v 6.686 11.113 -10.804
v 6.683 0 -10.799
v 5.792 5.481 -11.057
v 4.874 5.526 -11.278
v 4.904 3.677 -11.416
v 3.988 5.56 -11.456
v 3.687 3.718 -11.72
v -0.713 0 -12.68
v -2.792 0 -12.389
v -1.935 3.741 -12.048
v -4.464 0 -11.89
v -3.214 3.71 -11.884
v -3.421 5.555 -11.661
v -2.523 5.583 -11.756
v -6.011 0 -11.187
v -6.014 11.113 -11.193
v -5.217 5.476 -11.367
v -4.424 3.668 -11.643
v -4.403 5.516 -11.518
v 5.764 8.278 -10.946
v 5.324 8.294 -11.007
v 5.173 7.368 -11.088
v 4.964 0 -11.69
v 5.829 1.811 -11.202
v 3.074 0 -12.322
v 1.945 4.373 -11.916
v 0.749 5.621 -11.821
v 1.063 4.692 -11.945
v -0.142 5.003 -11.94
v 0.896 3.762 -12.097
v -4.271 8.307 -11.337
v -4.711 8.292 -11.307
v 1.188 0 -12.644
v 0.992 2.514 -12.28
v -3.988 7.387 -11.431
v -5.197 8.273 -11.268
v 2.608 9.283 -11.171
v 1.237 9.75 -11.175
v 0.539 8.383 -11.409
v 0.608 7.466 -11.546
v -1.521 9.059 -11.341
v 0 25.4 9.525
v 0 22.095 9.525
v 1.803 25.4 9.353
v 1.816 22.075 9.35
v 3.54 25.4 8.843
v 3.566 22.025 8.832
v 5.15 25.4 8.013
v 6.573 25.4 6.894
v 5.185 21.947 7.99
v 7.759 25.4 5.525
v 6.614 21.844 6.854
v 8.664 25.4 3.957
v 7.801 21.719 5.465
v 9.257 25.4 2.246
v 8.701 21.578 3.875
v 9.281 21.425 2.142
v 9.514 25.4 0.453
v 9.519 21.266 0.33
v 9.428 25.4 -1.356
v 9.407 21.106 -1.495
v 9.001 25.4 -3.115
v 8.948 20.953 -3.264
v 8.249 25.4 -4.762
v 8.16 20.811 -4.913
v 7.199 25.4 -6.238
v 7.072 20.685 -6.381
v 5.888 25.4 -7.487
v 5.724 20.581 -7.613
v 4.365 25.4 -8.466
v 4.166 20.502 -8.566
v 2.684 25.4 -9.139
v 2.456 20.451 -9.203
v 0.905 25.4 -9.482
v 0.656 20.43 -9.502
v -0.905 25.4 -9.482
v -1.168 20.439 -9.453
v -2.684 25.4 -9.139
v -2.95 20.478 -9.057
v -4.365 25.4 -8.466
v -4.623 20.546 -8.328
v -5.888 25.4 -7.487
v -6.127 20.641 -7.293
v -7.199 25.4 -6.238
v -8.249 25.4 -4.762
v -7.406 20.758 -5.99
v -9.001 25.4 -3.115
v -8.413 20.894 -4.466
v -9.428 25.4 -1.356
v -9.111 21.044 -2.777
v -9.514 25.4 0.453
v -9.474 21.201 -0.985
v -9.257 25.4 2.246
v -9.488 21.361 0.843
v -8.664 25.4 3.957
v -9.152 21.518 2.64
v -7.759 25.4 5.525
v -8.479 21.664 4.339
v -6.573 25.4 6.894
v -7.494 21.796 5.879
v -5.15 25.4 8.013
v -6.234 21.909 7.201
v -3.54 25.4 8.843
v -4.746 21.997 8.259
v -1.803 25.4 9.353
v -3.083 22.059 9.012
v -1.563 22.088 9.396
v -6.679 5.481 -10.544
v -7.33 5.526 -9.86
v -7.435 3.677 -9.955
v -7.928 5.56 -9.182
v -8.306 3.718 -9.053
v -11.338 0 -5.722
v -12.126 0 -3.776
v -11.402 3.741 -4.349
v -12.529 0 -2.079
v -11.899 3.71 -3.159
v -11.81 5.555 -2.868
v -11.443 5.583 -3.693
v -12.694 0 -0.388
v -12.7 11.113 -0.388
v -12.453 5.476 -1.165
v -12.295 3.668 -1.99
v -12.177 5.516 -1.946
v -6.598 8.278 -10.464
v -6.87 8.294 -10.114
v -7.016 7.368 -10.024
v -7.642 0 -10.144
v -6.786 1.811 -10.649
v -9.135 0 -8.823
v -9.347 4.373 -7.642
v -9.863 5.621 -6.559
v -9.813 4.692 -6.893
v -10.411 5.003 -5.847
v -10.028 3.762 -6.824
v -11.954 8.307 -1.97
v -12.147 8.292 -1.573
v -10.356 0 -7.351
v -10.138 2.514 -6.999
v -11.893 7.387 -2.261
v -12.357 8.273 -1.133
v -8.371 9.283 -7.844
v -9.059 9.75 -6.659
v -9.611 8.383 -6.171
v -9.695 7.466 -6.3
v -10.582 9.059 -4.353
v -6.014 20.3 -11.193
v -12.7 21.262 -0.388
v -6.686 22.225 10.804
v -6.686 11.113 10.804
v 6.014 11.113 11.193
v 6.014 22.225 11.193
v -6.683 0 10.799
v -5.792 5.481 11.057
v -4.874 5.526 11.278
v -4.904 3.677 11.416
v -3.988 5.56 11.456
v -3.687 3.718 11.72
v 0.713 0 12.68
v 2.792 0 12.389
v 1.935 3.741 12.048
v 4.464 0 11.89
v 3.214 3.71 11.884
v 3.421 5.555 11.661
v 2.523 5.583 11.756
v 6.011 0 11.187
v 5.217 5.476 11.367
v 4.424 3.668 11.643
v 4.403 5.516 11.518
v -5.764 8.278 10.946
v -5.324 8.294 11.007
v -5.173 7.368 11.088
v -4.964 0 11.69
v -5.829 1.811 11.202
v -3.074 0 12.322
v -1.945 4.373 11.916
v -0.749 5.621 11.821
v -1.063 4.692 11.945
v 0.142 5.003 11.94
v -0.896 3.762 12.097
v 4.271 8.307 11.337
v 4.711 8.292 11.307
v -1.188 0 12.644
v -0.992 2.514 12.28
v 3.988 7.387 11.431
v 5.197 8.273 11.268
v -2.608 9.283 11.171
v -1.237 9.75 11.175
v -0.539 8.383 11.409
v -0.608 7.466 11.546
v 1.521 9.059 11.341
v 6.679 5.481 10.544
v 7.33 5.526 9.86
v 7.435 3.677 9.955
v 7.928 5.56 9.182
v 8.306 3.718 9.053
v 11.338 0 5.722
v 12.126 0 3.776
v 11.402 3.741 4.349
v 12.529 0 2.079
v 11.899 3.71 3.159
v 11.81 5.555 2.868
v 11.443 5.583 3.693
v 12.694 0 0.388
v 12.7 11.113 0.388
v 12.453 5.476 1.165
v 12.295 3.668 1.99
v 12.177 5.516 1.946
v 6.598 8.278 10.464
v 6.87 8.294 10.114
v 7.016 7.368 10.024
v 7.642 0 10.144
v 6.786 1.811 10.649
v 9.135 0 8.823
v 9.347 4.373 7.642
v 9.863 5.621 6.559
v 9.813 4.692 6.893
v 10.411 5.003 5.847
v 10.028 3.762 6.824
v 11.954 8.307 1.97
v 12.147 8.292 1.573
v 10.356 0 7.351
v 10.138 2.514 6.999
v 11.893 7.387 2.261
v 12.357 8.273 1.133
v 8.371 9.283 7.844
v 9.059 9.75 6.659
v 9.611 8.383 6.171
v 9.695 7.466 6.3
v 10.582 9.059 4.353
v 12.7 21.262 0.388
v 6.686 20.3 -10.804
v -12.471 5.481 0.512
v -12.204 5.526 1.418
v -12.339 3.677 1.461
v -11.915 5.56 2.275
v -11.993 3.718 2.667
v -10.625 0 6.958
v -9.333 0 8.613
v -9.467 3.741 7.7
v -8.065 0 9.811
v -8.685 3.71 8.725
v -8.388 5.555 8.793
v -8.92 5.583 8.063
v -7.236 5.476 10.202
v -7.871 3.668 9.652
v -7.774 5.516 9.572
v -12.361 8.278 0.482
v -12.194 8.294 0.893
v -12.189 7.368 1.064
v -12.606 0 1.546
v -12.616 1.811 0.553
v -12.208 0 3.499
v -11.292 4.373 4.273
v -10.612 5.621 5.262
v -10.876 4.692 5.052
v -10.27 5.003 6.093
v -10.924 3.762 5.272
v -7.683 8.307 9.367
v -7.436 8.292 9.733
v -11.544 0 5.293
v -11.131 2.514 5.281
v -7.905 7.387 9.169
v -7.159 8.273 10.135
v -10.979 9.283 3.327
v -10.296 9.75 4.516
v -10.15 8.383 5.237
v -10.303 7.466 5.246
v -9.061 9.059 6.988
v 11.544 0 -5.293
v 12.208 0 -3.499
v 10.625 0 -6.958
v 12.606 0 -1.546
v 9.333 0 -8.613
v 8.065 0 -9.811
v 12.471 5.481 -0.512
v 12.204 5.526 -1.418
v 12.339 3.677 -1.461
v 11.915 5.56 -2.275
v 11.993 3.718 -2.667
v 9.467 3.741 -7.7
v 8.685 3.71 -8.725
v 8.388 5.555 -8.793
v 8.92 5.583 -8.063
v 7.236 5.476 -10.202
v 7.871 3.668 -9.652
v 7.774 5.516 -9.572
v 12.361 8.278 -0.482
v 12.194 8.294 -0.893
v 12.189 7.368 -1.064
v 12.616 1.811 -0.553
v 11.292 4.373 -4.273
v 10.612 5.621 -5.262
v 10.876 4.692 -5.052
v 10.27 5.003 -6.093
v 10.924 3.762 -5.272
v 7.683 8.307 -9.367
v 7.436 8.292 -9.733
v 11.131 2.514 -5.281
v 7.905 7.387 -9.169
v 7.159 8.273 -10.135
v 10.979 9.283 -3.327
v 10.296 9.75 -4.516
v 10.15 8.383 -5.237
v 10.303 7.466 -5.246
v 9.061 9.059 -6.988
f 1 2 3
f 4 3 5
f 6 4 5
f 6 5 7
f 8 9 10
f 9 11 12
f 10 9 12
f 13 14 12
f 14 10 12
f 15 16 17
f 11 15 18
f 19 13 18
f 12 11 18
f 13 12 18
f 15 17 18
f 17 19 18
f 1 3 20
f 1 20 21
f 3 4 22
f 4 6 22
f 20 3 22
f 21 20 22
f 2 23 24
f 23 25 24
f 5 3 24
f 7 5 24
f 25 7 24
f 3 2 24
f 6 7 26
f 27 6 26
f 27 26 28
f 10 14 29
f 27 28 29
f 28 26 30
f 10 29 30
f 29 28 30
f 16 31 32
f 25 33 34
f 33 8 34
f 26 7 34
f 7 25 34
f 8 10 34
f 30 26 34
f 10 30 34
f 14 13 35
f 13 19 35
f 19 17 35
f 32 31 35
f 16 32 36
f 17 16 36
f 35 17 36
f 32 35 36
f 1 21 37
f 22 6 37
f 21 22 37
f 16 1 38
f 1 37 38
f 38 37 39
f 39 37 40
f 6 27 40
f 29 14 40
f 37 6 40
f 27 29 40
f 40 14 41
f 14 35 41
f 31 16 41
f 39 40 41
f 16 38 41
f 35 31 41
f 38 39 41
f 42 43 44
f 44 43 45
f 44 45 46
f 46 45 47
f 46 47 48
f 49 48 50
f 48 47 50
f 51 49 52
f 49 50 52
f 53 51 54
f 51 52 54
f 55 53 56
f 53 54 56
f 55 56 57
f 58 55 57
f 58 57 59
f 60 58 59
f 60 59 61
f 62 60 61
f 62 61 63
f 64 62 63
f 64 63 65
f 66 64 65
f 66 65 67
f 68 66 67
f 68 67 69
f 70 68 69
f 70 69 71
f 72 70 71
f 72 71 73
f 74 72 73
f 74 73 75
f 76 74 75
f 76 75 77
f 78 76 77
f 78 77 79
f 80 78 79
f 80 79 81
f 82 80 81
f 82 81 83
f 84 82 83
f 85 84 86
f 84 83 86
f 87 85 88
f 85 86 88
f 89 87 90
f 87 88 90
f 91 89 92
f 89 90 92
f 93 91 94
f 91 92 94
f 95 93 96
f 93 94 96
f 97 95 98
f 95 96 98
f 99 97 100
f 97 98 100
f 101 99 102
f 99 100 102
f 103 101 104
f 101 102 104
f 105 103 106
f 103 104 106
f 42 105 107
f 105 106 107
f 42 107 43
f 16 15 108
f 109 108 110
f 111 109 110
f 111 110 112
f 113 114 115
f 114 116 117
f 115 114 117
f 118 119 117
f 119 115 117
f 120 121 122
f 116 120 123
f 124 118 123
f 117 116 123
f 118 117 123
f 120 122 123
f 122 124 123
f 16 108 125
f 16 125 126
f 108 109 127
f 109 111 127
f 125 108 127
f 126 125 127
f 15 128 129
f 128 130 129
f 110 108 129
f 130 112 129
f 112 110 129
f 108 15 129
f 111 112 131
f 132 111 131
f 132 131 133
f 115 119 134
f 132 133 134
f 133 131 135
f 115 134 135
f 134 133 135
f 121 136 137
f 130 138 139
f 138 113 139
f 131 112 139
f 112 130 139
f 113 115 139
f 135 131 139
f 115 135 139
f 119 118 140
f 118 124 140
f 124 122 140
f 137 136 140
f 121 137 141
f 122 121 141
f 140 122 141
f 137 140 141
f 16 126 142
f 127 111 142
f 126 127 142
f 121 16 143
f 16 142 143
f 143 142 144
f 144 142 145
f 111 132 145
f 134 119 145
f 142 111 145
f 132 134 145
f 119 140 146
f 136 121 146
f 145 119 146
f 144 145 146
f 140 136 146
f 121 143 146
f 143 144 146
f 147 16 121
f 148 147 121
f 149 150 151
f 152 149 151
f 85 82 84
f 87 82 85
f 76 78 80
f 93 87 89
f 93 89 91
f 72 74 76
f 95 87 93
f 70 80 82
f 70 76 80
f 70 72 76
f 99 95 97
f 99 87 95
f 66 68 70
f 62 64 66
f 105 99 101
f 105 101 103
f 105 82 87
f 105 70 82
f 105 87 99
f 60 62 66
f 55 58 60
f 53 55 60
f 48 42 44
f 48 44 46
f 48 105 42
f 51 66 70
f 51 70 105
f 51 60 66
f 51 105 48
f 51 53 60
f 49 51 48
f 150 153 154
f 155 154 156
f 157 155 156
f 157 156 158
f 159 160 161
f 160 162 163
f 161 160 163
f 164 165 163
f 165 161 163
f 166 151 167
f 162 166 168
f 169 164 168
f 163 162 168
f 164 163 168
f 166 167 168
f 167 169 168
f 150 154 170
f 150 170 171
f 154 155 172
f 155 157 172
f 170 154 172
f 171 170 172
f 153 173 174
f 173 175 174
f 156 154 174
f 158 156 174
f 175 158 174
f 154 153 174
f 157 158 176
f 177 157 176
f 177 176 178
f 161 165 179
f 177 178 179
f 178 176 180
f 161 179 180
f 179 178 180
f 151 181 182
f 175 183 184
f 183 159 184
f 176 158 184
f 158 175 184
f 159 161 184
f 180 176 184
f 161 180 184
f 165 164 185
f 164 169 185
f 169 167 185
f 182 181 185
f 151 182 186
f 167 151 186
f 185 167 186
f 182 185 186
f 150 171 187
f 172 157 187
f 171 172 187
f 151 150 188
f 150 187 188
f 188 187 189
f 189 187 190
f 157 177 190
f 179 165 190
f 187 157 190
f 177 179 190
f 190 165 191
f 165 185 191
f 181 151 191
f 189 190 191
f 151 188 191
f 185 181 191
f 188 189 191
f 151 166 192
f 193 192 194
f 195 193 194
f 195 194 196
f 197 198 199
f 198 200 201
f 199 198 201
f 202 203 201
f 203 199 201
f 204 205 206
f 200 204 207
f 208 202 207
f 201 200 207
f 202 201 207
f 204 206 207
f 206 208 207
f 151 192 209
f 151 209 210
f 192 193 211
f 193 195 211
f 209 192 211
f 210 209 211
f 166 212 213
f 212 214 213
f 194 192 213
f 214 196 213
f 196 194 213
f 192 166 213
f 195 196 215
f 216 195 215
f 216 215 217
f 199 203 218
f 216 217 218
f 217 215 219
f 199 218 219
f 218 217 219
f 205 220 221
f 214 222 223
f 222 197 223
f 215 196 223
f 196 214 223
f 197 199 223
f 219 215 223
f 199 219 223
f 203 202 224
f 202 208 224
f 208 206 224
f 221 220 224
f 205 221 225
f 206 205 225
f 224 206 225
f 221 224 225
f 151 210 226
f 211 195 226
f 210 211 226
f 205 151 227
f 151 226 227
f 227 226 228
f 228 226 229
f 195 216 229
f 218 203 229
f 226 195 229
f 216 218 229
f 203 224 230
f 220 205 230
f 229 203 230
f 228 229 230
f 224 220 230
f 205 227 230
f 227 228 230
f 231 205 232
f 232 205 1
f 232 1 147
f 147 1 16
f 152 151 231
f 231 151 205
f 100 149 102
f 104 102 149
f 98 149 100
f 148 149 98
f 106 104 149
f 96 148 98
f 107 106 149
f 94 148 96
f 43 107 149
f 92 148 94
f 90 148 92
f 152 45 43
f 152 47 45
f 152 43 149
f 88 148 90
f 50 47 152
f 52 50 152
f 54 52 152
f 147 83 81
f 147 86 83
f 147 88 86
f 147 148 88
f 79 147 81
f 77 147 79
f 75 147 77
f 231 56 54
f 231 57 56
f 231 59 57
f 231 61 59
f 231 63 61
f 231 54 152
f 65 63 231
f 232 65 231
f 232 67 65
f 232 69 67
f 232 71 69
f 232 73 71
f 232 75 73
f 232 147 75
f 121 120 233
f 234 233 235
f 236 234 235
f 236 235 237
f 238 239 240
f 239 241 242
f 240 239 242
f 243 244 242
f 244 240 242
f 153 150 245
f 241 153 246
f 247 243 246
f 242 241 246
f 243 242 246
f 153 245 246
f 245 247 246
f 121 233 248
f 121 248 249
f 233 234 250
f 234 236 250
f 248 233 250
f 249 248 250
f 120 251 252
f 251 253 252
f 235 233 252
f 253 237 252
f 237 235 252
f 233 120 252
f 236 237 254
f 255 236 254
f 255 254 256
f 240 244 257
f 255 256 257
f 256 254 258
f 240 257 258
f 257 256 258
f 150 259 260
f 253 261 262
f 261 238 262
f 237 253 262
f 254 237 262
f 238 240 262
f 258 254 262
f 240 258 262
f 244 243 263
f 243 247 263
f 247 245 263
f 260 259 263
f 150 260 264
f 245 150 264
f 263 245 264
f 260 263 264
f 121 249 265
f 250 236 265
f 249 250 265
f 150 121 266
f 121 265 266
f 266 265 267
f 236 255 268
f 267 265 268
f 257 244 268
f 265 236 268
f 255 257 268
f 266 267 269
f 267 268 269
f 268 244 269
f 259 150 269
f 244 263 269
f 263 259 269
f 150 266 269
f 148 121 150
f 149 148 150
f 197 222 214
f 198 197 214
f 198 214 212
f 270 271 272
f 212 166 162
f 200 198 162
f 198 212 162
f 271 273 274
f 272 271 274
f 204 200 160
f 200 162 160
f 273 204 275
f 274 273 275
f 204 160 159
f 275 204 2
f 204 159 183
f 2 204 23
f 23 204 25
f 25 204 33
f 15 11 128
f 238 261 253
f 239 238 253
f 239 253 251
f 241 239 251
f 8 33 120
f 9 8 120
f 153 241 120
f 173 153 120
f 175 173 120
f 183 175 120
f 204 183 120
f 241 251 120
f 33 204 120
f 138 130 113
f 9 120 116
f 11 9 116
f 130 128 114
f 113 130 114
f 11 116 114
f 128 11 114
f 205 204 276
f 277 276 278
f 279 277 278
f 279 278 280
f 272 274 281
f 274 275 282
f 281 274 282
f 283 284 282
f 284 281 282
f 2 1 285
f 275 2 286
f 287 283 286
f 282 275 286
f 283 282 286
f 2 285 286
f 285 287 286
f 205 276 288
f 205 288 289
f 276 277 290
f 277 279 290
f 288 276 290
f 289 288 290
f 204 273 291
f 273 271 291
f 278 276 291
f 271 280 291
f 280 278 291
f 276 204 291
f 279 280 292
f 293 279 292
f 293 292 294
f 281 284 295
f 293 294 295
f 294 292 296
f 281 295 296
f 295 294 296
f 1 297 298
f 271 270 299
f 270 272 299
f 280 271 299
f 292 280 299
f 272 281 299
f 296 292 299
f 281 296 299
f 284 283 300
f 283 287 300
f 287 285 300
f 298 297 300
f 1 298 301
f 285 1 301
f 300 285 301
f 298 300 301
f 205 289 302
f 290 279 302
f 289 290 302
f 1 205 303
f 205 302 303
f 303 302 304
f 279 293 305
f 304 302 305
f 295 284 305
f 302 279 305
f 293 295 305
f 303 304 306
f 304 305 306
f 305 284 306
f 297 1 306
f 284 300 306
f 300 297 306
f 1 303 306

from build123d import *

# Parameters (mm, degrees)
BOSS_EXTRUDE1_DEPTH      = 11.1125
DRAFT2_START             = 21.18139532
DRAFT2_OUTLINE_W         = 28
DRAFT2_OUTLINE_H         = 26
DRAFT2_DEPTH             = 1.91806369
BOSS_EXTRUDE2_DEPTH      = 3.175
BOSS_EXTRUDE2_DEPTH_BACK = 3.175
SKETCH7_R                = 9.525


# Read off the part's stored shape, not the designer's step: Draft2
with BuildPart() as part:
    # Sketch3 → Loft1 section 0
    with BuildSketch(Plane(origin=(0, 11.1125, 0), x_dir=(1, 0, 0), z_dir=(0, 1, 0))):
        with BuildLine():
            Line((6.01391392, -11.192562017), (12.7, -0.388078778))
            Line((12.7, -0.388078778), (6.68608608, 10.804483239))
            Line((6.68608608, 10.804483239), (-6.01391392, 11.192562017))
            Line((-6.01391392, 11.192562017), (-12.7, 0.388078778))
            Line((-12.7, 0.388078778), (-6.68608608, -10.804483239))
            Line((-6.68608608, -10.804483239), (6.01391392, -11.192562017))
        make_face()
    # Sketch2 for Loft1 → Loft1 section 1
    with BuildSketch(Plane(origin=(0, 0, 0), x_dir=(1, 0, 0), z_dir=(0, 1, 0))):
        with BuildLine():
            # circular arc as an exact rational Bezier (weights 1, cos(half-angle), 1)
            Bezier((6.011108127, -11.187340126), (12.47012196, -7.716825231), (12.694074813, -0.38789772), weights=[1, 0.866025404, 1])
            Bezier((12.694074813, -0.38789772), (12.918027667, 6.941029791), (6.682966686, 10.799442406), weights=[1, 0.866025404, 1])
            Bezier((6.682966686, 10.799442406), (0.447905706, 14.65785502), (-6.011108127, 11.187340126), weights=[1, 0.866025404, 1])
            Bezier((-6.011108127, 11.187340126), (-12.47012196, 7.716825231), (-12.694074813, 0.38789772), weights=[1, 0.866025404, 1])
            Bezier((-12.694074813, 0.38789772), (-12.918027667, -6.941029791), (-6.682966686, -10.799442406), weights=[1, 0.866025404, 1])
            Bezier((-6.682966686, -10.799442406), (-0.447905706, -14.65785502), (6.011108127, -11.187340126), weights=[1, 0.866025404, 1])
        make_face()
    loft()

    # Sketch3<2> → Boss-Extrude1 (add)
    with BuildSketch(Plane(origin=(0, 11.1125, 0), x_dir=(1, 0, 0), z_dir=(0, 1, 0))):
        Polygon((6.01391392, -11.192562017), (12.7, -0.388078778), (6.68608608, 10.804483239), (-6.01391392, 11.192562017), (-12.7, 0.388078778), (-6.68608608, -10.804483239), align=None)
    extrude(amount=BOSS_EXTRUDE1_DEPTH)

    # Draft2 outline → Draft2 (cut)
    with BuildSketch(Plane(origin=(0, 0, 0), x_dir=(0.999996456847854, -0.002651888614820864, 0.00023190194633995566), z_dir=(0.00266200896657633, 0.9961946980917459, -0.0871150802224119)).offset(DRAFT2_START)):
        with Locations((0, -2)):
            Rectangle(DRAFT2_OUTLINE_W, DRAFT2_OUTLINE_H)
    extrude(amount=DRAFT2_DEPTH, mode=Mode.SUBTRACT)

    # Sketch7 → Boss-Extrude2 (add, two sides: drawn at the far end of the back side and taken through both)
    with BuildSketch(Plane(origin=(0, 22.225, 0), x_dir=(1, 0, 0), z_dir=(0, 1, 0)).offset(-BOSS_EXTRUDE2_DEPTH_BACK)):
        with Locations(Location((0, 0, 0), (0, 0, 270))):
            Circle(SKETCH7_R)
    extrude(amount=BOSS_EXTRUDE2_DEPTH + BOSS_EXTRUDE2_DEPTH_BACK)


solid = part.part
